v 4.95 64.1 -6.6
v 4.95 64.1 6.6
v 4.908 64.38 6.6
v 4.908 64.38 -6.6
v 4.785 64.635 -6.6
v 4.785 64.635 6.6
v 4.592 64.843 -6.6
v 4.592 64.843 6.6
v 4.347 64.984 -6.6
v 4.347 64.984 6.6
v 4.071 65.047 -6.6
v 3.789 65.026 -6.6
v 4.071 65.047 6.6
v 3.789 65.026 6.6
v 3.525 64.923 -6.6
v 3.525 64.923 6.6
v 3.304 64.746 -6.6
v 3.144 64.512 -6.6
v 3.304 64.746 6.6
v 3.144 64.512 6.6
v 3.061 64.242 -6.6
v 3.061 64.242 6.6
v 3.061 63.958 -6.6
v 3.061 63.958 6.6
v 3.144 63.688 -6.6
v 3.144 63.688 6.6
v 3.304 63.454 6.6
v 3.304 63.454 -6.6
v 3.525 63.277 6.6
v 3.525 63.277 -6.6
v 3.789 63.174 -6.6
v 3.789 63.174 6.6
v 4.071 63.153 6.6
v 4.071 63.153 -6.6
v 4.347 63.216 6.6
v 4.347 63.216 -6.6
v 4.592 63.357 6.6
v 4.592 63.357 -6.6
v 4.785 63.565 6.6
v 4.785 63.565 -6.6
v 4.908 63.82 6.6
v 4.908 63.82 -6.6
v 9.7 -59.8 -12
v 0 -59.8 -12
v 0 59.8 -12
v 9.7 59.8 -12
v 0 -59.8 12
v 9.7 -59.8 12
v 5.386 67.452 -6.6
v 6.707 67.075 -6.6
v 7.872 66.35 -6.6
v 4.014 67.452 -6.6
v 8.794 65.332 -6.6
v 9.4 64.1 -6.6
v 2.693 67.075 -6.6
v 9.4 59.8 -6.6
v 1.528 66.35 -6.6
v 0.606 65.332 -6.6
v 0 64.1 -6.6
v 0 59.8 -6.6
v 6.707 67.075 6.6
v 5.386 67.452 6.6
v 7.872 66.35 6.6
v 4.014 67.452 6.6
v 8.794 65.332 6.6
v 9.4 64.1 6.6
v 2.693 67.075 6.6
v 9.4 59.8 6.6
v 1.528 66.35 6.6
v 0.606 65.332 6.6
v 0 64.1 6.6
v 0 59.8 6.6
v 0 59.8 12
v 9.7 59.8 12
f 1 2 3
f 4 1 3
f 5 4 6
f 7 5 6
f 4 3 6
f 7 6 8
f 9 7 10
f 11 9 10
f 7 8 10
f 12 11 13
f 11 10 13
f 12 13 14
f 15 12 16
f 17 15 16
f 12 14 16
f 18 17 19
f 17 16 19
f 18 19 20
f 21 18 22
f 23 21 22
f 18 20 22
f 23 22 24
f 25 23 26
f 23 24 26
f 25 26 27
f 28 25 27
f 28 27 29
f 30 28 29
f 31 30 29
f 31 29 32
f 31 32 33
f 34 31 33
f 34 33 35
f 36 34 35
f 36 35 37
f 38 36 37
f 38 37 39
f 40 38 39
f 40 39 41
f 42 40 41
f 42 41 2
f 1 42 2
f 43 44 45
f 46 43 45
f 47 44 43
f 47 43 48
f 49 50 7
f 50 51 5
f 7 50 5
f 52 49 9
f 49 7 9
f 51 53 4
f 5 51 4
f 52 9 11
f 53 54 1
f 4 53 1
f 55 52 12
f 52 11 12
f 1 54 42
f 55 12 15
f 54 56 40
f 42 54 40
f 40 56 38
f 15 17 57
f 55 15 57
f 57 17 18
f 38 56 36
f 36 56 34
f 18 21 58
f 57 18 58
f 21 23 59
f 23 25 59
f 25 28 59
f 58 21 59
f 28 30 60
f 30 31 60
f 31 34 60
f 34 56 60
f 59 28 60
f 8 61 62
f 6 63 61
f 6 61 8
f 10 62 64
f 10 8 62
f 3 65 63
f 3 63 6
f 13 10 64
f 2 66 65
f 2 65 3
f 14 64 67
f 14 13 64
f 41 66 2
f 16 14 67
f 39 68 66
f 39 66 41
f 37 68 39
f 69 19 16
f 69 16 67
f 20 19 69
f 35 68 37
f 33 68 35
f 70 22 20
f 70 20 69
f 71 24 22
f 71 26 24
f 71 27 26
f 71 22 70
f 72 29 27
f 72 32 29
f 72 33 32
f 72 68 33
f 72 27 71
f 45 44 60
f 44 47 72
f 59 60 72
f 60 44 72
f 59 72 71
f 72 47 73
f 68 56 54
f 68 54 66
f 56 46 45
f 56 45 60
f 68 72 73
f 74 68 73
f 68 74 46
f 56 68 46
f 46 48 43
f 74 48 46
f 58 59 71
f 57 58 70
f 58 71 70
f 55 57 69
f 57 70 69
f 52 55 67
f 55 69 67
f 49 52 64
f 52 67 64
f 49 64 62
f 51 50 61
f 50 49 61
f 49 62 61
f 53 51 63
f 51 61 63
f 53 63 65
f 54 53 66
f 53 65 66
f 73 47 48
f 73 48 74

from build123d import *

# Parameters (mm, degrees)
SKETCH1_W           = 119.6
SKETCH1_H           = 24
BOSS_EXTRUDE1_DEPTH = 9.7
SKETCH3_W           = 9.4
SKETCH3_H           = 13.2
BOSS_EXTRUDE2_DEPTH = 8
SKETCH4_R           = 0.95
CUT_EXTRUDE1_DEPTH  = 71.971050436


with BuildPart() as part:
    # Sketch1 → Boss-Extrude1 (new body)
    with BuildSketch(Plane.YZ):
        Rectangle(SKETCH1_W, SKETCH1_H)
    extrude(amount=BOSS_EXTRUDE1_DEPTH)

    # Sketch3 → Boss-Extrude2 (add)
    with BuildSketch(Plane(origin=(0, 59.8, 0), x_dir=(-1, 0, 0), z_dir=(0, 1, 0))):
        with Locations((-4.7, 0)):
            Rectangle(SKETCH3_W, SKETCH3_H)
    extrude(amount=BOSS_EXTRUDE2_DEPTH)

    # Sketch4 → Cut-Extrude1 (cut, through all)
    with BuildSketch(Plane.XY.offset(6.6)):
        with BuildLine():
            Line((0, 67.8), (0, 64.1))
            ThreePointArc((0, 64.1), (4.7, 67.5), (9.4, 64.1))
            Line((9.4, 64.1), (9.4, 67.8))
            Line((9.4, 67.8), (0, 67.8))
        make_face()
        with Locations((4, 64.1)):
            Circle(SKETCH4_R)
    extrude(amount=-CUT_EXTRUDE1_DEPTH, mode=Mode.SUBTRACT)


solid = part.part
